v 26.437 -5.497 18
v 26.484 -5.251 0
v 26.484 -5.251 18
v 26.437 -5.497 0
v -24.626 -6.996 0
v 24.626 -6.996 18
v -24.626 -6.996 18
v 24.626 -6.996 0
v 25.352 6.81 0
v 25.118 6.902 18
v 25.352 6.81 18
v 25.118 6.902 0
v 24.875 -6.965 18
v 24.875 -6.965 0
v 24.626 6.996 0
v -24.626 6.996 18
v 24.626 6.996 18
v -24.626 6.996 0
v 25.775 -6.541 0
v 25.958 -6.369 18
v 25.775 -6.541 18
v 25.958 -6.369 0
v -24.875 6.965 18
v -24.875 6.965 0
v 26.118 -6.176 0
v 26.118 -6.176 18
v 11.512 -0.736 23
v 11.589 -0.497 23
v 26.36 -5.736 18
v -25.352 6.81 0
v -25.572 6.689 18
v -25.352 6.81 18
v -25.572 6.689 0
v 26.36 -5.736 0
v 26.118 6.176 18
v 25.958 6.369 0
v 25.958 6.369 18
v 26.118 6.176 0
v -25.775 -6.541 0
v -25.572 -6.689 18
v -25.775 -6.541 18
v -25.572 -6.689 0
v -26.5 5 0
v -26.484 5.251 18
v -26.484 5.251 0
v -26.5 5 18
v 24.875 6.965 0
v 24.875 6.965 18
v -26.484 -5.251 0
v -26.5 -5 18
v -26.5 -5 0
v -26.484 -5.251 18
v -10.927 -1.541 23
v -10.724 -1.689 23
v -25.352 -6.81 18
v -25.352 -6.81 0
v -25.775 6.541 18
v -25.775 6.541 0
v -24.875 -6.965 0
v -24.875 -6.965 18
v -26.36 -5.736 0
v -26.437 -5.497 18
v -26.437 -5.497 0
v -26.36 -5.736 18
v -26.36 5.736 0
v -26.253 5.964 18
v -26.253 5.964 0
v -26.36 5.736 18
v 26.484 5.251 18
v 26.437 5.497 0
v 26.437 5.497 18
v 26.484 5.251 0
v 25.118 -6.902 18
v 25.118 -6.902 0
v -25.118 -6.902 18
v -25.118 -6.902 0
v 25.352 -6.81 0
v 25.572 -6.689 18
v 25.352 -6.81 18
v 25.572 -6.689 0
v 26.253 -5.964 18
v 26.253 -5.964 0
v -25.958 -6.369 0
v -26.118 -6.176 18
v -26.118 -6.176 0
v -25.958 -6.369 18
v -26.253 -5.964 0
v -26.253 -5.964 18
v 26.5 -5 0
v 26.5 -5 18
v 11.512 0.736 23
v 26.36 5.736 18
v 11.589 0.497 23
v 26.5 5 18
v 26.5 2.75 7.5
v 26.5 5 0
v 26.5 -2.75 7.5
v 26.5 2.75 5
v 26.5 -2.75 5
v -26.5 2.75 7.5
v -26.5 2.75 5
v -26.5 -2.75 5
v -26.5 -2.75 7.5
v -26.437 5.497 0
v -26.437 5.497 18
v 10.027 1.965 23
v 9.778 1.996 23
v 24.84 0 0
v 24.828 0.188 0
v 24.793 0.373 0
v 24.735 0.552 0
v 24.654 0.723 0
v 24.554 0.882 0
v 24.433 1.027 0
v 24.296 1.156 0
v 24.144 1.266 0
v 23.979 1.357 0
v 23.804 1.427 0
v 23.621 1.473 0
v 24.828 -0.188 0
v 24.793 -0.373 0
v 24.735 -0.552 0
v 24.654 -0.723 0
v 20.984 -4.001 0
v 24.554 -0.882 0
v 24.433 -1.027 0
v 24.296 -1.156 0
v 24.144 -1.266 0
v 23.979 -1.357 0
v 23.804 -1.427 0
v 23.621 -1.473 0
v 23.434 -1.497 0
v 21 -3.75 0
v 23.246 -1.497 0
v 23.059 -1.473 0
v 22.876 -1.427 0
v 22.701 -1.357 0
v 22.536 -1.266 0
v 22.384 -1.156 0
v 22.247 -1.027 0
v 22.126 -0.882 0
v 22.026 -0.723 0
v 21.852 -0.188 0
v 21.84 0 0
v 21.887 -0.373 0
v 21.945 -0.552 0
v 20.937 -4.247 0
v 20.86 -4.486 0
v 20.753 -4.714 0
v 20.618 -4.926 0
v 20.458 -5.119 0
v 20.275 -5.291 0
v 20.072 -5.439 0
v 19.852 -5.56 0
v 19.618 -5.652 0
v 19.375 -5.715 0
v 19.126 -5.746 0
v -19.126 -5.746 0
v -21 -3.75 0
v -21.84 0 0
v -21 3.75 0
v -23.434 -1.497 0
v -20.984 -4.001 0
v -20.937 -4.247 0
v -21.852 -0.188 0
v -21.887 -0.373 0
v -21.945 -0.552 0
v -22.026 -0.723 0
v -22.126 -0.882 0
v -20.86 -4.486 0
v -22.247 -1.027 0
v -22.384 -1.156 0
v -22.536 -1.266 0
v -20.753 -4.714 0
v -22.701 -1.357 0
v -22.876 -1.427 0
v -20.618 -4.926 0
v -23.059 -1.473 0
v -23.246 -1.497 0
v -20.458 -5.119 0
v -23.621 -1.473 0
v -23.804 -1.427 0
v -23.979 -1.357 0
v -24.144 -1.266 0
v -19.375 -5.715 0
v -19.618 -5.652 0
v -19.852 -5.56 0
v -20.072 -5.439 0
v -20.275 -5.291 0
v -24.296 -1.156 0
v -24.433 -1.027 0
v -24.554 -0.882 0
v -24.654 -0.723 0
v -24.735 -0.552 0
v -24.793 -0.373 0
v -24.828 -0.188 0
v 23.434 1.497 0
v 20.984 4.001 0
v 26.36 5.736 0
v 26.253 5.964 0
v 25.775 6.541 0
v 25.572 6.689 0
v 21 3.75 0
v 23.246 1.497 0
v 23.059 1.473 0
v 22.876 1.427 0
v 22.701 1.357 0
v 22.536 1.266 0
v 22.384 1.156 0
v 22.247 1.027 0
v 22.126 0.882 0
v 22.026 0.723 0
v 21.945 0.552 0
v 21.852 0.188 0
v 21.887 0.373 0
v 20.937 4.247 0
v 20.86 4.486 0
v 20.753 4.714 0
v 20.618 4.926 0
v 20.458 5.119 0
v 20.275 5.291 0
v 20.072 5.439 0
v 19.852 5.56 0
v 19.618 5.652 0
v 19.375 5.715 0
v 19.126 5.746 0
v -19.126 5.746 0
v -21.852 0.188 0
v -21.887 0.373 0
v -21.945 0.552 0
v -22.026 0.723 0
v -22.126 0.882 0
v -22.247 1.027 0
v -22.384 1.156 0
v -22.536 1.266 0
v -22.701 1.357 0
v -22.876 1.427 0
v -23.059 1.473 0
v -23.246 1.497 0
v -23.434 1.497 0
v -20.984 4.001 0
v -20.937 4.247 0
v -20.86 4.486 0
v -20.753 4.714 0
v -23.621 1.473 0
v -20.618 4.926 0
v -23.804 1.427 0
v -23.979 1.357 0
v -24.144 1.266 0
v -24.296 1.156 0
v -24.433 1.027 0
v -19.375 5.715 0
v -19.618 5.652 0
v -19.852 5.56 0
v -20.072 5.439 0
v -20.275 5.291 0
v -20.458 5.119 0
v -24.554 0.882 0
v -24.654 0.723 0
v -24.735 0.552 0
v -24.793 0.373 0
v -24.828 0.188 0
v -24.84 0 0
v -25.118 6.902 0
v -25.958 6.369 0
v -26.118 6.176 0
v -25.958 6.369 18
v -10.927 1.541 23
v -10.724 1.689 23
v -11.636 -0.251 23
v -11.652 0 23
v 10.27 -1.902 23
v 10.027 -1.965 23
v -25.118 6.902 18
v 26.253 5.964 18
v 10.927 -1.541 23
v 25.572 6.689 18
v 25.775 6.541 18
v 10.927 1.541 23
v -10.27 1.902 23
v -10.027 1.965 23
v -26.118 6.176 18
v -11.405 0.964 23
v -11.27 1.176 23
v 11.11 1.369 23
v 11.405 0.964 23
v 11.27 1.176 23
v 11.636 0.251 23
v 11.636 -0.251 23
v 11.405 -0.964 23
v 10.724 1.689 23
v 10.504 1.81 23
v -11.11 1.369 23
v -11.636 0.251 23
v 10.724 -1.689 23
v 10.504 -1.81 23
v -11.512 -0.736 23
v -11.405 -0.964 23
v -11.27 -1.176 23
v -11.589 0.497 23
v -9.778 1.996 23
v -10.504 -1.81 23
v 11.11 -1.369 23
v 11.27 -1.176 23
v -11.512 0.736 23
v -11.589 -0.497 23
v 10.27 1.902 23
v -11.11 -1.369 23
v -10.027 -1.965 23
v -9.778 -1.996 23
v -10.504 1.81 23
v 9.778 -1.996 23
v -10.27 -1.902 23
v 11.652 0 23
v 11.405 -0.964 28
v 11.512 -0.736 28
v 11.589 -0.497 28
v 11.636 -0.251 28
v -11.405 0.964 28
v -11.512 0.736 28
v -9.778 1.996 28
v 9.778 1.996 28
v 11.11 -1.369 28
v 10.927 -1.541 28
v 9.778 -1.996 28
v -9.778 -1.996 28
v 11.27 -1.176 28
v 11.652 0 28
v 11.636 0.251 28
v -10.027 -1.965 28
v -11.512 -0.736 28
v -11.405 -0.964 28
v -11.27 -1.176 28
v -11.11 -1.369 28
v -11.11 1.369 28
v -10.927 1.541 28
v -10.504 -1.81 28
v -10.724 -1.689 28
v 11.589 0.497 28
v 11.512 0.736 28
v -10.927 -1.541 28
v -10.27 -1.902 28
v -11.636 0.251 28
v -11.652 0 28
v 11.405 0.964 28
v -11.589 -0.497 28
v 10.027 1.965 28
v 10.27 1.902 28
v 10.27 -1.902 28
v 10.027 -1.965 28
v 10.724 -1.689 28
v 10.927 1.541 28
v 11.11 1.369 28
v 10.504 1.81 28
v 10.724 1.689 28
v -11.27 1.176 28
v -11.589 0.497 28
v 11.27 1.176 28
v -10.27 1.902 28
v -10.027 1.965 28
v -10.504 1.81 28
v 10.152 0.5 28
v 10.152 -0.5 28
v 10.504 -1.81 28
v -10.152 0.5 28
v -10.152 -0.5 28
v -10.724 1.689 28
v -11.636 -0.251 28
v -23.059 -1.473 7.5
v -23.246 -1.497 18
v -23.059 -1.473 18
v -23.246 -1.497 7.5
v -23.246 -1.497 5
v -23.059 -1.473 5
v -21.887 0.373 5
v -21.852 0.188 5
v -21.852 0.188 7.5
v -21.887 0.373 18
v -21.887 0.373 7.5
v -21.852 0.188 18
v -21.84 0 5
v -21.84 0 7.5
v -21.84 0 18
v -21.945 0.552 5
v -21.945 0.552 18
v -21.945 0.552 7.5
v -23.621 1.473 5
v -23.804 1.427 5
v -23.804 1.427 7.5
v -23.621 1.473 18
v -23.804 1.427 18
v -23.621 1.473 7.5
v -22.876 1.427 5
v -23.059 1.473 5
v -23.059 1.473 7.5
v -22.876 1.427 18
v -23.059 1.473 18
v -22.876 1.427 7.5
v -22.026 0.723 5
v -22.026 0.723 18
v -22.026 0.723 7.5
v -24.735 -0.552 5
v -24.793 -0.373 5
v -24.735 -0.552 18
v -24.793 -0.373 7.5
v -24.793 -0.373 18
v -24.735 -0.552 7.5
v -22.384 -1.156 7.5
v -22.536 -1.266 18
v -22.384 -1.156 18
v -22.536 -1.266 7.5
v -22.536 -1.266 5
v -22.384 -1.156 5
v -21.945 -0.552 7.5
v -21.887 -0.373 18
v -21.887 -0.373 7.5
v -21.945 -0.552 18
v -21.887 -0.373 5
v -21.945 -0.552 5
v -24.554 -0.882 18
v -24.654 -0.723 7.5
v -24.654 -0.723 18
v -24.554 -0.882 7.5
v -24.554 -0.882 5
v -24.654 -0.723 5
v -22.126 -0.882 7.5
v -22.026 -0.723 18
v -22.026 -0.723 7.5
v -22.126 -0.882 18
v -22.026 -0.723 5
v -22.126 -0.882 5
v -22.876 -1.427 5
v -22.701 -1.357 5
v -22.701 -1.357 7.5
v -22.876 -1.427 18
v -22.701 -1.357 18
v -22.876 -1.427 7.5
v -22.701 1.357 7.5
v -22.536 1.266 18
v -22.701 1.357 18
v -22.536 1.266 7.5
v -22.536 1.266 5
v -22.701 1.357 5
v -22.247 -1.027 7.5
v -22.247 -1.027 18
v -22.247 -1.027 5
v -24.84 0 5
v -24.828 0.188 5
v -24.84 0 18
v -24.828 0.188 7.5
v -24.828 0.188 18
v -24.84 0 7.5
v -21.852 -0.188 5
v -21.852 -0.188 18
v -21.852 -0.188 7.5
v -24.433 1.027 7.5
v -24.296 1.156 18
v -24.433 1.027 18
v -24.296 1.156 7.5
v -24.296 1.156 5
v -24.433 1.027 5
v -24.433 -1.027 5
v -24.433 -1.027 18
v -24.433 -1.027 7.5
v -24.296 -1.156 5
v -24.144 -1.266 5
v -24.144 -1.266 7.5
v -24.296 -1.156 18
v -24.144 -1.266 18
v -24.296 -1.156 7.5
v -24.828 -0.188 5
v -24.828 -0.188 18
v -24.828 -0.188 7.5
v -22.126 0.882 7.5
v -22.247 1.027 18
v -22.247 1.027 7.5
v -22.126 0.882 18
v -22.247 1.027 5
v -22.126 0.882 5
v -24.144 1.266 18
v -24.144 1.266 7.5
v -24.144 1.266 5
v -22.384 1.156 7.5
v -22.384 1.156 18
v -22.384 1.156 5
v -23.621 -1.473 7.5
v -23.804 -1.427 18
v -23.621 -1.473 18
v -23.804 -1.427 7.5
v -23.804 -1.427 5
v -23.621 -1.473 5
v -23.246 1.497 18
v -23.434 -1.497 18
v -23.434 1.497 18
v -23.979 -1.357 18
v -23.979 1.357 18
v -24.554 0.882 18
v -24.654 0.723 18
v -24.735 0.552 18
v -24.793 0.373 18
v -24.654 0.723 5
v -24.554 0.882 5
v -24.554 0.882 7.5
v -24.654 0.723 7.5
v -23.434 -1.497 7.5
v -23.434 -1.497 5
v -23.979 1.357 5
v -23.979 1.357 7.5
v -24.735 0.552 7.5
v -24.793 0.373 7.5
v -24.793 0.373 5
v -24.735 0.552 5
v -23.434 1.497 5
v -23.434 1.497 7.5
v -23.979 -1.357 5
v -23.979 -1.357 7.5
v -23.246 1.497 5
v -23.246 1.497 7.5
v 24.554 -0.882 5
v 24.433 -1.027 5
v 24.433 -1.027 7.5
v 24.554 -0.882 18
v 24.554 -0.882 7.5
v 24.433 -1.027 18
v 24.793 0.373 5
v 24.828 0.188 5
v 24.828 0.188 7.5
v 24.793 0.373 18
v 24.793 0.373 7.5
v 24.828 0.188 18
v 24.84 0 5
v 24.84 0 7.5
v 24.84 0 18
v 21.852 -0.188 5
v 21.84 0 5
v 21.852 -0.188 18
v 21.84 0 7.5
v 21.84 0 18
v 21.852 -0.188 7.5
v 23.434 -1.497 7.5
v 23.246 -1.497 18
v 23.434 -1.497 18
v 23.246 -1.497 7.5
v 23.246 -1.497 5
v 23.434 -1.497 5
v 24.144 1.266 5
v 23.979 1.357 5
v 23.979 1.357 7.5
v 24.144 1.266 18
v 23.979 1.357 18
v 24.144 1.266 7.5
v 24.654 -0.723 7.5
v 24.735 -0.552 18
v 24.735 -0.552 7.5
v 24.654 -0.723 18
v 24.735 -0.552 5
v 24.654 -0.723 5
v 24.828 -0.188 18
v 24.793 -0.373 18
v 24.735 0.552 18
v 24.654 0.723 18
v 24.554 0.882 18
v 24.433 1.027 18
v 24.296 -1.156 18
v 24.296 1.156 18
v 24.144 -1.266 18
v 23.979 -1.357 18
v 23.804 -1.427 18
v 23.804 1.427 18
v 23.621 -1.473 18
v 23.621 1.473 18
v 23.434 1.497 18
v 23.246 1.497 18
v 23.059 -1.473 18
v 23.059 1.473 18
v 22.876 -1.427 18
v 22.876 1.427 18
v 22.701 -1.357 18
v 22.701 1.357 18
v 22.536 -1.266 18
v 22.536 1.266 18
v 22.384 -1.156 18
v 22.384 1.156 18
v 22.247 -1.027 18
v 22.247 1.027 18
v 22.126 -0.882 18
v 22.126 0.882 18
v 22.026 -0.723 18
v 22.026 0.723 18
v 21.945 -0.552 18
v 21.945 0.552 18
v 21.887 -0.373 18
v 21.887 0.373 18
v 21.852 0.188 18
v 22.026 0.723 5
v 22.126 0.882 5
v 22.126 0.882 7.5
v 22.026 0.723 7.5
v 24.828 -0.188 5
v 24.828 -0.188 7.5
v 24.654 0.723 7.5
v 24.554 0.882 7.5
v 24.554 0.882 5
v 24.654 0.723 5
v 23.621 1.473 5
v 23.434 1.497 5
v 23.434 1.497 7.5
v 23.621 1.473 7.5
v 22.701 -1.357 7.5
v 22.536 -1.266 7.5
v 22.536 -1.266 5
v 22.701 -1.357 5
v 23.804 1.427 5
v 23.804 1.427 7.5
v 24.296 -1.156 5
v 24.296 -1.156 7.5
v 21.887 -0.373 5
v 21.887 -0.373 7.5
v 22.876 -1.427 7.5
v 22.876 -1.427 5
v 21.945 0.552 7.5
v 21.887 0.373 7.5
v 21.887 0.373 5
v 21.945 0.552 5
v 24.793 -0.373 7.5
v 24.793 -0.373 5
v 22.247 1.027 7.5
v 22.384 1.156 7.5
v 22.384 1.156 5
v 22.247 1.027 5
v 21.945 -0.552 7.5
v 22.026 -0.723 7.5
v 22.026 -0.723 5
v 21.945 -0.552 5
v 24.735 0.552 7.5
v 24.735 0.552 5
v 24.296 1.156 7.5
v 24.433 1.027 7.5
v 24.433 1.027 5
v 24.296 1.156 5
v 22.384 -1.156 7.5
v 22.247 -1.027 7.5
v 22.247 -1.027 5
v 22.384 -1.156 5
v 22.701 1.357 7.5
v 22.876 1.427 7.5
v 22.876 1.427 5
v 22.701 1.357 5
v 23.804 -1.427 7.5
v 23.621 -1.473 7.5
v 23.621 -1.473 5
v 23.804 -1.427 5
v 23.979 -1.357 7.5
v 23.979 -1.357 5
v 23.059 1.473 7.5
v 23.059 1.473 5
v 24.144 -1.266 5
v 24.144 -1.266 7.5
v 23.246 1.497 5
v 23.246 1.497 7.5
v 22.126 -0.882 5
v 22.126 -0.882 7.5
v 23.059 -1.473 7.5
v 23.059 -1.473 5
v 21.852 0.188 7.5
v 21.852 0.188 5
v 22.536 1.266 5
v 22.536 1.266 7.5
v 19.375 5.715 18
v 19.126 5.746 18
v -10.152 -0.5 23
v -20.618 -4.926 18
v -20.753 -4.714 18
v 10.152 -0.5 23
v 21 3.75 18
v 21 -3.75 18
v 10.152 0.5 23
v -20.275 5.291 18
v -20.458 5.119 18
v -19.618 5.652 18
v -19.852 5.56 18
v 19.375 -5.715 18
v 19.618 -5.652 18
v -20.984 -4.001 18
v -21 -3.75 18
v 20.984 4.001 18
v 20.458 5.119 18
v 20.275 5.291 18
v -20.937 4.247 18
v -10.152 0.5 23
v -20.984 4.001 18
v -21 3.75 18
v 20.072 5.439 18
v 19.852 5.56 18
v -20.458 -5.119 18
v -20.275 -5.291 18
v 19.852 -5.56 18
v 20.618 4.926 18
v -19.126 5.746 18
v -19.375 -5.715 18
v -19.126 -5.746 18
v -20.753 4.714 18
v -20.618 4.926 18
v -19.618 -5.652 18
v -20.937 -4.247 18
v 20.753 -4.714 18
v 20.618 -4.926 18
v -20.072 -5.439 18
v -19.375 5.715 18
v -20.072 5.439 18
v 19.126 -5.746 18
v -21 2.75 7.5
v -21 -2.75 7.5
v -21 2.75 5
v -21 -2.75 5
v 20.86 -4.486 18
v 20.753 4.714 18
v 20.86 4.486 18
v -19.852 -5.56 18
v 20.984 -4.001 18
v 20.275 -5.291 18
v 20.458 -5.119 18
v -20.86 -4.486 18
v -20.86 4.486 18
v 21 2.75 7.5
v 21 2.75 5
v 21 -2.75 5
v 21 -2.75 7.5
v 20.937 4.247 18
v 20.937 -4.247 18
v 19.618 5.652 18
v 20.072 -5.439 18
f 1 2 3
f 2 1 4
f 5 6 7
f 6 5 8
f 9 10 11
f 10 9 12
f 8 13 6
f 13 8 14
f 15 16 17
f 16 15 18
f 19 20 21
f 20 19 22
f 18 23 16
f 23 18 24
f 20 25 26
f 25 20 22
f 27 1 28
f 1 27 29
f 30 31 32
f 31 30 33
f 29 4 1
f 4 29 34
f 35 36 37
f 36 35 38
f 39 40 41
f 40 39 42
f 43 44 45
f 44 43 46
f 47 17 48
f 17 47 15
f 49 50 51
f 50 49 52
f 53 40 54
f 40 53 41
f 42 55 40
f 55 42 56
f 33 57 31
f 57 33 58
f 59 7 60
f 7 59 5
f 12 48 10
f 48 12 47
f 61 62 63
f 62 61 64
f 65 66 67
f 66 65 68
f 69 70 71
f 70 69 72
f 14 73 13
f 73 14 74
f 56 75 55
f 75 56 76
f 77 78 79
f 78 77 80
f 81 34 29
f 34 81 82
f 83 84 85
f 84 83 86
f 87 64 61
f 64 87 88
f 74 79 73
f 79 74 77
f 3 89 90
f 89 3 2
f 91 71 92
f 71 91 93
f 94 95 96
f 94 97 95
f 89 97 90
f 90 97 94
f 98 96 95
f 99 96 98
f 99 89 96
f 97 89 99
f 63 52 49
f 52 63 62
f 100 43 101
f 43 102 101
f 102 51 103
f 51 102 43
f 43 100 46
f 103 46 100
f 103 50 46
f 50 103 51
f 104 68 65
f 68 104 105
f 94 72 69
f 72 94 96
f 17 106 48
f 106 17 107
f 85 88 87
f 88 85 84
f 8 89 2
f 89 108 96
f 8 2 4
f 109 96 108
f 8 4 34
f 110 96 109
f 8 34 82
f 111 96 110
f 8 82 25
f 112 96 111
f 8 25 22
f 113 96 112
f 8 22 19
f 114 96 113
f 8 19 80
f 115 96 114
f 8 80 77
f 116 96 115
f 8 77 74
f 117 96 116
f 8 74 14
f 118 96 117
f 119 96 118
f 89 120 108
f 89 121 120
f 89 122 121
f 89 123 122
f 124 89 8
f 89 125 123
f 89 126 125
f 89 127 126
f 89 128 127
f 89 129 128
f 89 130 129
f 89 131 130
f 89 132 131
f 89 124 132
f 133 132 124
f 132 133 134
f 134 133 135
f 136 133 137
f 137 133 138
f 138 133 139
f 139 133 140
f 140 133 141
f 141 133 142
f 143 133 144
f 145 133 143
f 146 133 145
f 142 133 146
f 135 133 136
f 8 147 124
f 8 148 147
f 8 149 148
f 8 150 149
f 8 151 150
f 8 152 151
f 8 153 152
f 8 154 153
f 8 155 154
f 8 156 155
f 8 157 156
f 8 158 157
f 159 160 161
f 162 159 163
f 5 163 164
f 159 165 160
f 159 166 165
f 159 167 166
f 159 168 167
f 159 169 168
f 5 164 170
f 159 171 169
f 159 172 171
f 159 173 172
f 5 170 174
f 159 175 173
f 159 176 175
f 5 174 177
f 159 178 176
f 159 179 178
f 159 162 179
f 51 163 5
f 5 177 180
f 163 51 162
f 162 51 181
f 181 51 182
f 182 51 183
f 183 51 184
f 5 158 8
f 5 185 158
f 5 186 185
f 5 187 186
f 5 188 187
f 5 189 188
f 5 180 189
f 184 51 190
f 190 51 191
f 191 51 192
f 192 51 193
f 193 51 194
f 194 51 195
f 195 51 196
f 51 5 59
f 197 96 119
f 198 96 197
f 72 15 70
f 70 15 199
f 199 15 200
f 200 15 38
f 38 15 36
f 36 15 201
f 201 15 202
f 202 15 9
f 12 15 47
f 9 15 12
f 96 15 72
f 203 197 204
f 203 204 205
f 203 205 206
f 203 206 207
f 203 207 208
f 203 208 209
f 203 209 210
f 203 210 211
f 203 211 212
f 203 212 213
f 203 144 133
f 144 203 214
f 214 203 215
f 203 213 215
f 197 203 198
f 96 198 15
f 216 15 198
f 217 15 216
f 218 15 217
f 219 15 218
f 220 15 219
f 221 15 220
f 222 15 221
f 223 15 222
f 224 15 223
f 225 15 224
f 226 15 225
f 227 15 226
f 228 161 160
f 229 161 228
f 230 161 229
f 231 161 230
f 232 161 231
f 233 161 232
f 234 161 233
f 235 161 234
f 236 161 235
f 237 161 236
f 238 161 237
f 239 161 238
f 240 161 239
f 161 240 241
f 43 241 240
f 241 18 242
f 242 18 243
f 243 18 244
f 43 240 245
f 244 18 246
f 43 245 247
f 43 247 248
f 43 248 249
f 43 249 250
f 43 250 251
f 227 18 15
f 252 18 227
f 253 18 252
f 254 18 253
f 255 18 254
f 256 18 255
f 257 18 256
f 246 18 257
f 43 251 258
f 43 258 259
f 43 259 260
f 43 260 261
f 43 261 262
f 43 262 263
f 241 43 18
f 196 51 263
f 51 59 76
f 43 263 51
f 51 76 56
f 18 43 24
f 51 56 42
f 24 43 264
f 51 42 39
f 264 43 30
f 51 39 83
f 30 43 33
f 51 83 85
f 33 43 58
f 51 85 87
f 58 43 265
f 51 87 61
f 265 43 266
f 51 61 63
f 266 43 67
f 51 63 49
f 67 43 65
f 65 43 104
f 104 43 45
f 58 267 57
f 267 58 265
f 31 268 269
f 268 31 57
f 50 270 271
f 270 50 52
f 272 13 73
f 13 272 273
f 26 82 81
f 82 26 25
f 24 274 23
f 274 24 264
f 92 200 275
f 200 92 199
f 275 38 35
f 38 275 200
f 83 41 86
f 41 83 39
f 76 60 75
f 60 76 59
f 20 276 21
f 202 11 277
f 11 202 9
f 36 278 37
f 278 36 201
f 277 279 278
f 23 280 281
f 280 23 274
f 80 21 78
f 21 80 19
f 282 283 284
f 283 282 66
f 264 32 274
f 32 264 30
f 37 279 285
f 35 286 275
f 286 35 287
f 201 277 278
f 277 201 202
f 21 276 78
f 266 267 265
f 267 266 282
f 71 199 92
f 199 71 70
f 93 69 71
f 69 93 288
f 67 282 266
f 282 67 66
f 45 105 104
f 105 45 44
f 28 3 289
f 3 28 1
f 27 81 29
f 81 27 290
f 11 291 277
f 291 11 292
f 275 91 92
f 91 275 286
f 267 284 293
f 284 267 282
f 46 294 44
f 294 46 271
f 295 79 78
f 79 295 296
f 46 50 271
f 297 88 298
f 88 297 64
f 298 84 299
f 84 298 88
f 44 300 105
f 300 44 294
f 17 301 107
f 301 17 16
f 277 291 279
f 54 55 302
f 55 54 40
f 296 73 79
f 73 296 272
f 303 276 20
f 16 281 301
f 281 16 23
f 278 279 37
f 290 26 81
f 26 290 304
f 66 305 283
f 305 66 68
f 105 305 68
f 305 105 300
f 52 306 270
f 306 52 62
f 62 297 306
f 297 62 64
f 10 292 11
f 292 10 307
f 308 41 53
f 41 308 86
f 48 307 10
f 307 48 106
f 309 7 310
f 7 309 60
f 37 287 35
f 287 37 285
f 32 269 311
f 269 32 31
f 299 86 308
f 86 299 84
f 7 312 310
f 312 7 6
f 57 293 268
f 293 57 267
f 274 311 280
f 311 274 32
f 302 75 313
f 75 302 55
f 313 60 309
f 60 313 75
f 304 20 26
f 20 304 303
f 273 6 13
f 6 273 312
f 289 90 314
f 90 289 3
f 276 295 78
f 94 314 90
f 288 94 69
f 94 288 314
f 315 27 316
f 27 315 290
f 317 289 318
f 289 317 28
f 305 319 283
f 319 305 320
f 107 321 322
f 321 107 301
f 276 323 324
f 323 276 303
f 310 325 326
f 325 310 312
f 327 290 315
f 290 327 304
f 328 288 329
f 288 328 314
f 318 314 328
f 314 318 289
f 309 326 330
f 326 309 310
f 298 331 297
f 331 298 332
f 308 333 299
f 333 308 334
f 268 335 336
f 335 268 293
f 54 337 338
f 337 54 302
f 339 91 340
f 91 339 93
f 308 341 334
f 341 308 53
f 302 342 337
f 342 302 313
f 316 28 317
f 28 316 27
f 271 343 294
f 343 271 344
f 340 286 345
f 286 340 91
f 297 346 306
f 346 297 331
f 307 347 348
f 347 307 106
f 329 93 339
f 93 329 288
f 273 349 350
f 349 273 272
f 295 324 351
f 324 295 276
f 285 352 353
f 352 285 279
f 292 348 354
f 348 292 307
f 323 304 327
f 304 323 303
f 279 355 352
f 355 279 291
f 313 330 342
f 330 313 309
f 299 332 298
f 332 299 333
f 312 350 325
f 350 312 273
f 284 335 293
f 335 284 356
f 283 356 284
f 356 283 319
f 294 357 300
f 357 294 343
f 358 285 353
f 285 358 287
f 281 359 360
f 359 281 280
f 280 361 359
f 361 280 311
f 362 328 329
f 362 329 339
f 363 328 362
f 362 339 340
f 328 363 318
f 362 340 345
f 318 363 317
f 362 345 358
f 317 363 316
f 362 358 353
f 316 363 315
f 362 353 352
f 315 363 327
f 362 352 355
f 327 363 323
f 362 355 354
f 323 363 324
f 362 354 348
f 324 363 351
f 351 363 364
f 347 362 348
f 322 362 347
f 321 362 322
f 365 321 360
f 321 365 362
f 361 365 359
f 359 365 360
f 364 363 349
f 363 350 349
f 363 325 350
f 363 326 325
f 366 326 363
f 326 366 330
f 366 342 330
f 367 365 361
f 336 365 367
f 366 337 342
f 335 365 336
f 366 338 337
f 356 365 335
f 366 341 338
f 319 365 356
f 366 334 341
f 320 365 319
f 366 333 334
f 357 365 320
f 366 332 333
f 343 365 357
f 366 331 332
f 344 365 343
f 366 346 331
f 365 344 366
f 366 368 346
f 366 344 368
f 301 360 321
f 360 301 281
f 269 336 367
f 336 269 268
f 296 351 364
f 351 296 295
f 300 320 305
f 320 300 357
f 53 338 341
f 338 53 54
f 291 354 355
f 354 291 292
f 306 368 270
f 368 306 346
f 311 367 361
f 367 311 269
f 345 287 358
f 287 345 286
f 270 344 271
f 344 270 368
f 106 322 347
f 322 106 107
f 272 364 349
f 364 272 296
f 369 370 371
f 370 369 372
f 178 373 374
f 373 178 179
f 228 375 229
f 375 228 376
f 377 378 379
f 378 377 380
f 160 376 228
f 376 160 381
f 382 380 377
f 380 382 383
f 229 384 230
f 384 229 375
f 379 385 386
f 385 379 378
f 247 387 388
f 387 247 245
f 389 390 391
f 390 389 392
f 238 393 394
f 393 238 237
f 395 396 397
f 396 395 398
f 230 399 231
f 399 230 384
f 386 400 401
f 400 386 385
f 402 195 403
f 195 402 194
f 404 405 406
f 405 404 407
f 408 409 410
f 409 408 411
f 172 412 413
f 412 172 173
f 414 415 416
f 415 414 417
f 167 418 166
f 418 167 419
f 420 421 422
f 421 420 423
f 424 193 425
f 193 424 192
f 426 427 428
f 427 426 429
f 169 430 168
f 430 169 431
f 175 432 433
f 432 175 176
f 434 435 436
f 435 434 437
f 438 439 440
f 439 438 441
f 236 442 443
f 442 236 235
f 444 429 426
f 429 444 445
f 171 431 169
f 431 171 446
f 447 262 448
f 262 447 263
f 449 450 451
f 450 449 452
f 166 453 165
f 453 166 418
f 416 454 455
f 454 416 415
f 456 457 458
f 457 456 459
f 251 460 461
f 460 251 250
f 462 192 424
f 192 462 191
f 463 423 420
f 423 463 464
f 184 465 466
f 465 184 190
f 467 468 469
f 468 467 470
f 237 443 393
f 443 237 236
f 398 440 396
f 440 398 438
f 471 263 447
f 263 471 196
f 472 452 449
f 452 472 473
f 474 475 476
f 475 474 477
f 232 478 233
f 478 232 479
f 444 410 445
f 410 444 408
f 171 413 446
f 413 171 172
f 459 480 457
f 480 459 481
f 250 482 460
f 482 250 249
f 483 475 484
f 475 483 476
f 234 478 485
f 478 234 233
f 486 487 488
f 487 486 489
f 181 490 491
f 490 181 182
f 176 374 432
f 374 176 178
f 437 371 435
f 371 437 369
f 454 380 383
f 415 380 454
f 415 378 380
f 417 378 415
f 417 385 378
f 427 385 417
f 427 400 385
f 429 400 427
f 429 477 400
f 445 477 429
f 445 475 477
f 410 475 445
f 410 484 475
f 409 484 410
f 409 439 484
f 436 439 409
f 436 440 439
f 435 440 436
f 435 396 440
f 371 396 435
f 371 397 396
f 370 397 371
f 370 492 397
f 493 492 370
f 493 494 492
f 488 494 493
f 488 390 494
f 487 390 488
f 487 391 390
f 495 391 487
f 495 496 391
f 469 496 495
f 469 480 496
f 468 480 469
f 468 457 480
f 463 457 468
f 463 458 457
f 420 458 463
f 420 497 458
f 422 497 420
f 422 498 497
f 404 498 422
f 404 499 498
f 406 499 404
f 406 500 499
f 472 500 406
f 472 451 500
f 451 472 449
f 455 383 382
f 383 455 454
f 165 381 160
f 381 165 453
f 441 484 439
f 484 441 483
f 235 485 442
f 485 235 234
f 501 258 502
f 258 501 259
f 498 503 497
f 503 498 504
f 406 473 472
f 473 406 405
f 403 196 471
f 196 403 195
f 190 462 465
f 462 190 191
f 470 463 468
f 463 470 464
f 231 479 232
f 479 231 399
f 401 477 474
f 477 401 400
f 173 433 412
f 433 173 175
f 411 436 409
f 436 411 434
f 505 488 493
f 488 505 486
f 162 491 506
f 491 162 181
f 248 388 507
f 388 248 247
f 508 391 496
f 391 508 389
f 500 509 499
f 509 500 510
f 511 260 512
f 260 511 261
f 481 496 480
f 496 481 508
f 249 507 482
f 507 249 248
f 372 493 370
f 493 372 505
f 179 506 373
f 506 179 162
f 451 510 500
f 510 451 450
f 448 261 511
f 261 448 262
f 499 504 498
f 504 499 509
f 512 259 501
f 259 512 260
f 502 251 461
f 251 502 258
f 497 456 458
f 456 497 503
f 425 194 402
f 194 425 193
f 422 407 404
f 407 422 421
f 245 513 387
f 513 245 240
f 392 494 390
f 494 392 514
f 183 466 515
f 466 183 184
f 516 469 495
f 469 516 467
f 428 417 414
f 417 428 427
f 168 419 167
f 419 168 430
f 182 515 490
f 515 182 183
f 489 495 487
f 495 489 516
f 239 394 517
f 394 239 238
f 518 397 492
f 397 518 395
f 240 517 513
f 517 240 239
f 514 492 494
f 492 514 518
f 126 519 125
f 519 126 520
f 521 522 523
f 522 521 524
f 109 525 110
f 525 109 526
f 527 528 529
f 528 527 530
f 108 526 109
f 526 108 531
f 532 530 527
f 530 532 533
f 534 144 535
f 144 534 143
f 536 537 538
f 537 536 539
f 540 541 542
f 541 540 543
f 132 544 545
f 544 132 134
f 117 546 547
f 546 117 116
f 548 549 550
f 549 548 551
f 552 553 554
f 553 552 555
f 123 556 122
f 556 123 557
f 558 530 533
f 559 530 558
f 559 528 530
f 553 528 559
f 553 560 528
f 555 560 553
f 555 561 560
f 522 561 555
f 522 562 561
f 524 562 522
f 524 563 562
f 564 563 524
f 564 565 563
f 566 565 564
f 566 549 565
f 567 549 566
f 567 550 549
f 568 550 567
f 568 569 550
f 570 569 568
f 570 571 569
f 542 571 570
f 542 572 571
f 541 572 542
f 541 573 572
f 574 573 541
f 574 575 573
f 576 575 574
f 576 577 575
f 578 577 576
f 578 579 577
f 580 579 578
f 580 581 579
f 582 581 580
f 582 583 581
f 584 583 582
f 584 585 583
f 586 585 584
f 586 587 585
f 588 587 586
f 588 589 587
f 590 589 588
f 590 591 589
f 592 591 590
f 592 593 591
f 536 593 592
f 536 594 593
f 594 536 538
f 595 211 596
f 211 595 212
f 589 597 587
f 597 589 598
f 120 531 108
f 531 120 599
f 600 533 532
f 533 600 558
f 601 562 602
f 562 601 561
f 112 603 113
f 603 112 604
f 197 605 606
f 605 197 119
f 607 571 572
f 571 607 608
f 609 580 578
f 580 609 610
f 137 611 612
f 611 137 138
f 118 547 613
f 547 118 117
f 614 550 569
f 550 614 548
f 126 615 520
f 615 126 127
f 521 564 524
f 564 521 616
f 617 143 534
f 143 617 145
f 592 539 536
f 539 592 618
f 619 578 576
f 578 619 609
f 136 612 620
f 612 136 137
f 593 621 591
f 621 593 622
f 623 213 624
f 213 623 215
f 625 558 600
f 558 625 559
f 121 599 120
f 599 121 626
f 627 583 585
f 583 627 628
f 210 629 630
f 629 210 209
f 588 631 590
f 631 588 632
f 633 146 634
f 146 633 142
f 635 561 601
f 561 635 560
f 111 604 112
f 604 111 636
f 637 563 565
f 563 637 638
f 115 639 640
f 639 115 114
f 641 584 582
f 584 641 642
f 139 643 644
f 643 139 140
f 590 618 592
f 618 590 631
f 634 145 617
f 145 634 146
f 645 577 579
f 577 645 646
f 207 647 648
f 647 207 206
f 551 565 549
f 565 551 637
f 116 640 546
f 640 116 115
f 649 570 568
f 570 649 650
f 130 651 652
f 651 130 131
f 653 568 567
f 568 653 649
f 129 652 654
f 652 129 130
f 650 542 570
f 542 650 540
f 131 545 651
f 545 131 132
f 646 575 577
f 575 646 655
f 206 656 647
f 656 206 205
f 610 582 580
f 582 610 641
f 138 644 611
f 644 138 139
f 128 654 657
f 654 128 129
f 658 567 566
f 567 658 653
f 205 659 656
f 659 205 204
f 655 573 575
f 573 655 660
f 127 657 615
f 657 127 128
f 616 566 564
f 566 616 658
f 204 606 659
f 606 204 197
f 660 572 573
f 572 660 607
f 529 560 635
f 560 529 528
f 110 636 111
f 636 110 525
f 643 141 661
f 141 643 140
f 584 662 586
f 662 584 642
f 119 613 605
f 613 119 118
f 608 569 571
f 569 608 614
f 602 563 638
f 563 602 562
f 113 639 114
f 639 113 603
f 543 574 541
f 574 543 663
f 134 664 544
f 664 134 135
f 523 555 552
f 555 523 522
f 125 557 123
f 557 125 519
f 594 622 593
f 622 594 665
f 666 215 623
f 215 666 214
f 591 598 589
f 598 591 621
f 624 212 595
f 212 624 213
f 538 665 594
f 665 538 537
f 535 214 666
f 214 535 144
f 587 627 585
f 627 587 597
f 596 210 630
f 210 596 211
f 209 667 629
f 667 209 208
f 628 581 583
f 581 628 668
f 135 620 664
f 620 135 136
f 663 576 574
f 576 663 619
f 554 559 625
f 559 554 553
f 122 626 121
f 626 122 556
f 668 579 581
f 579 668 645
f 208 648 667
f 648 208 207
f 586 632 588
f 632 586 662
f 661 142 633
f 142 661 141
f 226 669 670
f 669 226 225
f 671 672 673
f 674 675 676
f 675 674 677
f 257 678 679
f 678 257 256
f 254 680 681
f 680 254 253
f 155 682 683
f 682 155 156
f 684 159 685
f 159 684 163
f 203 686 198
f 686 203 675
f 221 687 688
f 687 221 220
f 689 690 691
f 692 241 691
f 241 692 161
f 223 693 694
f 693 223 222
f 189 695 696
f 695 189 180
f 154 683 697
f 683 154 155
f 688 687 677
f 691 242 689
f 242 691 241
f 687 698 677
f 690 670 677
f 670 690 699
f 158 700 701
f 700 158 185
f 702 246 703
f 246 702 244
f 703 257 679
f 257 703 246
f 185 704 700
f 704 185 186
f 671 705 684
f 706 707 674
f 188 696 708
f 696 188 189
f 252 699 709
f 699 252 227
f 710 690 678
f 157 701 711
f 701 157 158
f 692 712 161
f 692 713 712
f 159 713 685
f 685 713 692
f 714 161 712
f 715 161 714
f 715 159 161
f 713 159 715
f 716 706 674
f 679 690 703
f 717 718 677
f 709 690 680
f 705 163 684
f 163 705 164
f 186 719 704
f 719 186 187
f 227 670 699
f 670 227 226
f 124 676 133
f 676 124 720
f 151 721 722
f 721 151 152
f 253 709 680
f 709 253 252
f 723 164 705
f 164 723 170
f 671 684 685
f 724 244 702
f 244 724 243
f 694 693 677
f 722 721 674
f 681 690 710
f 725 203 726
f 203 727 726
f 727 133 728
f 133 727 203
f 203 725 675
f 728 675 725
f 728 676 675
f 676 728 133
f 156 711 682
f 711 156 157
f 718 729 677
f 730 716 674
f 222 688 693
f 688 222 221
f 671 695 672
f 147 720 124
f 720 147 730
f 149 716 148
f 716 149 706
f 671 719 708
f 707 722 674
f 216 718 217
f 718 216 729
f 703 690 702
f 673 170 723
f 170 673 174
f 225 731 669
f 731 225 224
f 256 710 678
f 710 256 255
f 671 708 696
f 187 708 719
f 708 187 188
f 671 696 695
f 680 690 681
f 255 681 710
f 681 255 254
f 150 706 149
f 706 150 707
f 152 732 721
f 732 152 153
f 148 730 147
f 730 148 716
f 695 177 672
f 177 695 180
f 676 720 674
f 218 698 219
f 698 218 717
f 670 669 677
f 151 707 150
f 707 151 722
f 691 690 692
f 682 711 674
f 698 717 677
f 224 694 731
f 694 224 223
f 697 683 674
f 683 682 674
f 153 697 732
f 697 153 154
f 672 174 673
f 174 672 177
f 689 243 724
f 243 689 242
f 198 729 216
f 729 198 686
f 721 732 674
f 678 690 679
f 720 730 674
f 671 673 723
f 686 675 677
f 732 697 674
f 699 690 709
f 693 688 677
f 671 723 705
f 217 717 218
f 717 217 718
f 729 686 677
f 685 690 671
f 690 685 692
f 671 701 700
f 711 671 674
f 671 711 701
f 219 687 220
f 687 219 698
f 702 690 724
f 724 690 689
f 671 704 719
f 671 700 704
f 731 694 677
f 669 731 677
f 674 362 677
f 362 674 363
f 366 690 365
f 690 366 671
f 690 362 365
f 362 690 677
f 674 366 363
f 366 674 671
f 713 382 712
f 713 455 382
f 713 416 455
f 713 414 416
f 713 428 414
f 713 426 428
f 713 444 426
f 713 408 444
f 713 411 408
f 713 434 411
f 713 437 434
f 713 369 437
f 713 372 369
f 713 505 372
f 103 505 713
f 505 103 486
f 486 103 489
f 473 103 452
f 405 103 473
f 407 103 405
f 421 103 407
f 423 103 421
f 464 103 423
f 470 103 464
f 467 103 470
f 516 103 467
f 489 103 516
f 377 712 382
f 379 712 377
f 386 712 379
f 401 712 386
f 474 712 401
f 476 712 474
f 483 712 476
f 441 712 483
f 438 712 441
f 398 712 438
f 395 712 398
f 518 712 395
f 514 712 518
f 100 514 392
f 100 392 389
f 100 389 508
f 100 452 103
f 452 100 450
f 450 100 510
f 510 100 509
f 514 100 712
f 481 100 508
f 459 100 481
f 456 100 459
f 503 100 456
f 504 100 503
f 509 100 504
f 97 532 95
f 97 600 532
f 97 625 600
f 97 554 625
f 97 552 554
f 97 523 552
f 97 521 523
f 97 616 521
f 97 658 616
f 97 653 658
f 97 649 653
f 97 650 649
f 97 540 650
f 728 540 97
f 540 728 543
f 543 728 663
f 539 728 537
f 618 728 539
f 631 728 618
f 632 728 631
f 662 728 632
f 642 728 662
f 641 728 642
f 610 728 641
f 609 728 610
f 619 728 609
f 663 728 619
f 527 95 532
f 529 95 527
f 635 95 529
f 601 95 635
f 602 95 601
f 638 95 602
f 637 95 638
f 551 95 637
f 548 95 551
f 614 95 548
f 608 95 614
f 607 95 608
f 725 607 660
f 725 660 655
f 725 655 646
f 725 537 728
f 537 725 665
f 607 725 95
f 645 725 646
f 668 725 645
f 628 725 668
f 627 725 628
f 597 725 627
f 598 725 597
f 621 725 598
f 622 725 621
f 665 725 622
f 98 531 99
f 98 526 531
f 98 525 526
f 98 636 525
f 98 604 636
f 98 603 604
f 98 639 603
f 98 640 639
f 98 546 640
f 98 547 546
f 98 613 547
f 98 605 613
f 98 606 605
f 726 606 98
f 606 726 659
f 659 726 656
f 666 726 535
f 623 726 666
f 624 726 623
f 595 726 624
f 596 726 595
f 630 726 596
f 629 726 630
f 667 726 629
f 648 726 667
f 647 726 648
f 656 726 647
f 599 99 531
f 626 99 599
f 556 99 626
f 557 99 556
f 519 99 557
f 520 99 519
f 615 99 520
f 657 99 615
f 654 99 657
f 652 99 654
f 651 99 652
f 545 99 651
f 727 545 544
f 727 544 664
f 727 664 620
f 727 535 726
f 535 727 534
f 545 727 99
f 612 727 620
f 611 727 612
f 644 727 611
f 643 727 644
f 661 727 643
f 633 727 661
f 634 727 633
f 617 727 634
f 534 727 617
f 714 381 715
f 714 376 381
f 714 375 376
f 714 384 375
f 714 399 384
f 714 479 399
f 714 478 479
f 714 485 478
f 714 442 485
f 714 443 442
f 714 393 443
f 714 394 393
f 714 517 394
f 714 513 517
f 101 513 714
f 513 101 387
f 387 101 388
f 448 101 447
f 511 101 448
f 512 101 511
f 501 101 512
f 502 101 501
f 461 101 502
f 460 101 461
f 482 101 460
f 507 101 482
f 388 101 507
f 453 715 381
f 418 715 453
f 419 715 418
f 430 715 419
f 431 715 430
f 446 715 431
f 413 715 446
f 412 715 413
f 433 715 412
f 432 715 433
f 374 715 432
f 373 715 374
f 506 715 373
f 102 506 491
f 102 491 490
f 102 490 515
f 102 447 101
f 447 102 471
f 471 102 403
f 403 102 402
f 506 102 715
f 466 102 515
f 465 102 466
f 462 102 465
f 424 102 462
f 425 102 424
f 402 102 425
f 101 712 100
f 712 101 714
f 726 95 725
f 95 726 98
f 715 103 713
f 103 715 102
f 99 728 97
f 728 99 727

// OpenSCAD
// file: lib/chassis-connector-housing.scad
// Chassis Connector Housing
// By Hans Christian Saustrup <hc@saustrup.net>
model_version = "v0.0.1";

ds = 3.0;
t = 1.5;

module flat_rounded_cube(size, d=4) {
    _size = [
        size.x - d,
        size.y - d,
        size.z
    ];

    translate([d/2, d/2])
    hull()
    for (x=[0, 1])
    for (y=[0, 1])
    translate([
        x * _size.x,
        y * _size.y,
        0
    ])
    cylinder(d=d, h=_size.z);
}

module _cube(size, d=4) {
    flat_rounded_cube(size, d);
    // cube(size);
}

module __generic_chassis_connector_housing(cutout, screw_distance, wires) {

    echo(["Cutout:", cutout]);
    echo(["Screw distance:", screw_distance]);

    // Flat cable - leave room for one extra wire
    cable_pitch = 1.269;
    cable_hole = [wires * cable_pitch, 1, 5];

    house1 = [
        screw_distance + 6.32,
        cutout.y + 1 + t,
        18
    ];

    house1_cutout = [
        cutout.x,
        cutout.y,
        house1.z
    ];

    house2 = [
        cable_hole.x + (2*t),
        cable_hole.y + (2*t),
        cable_hole.z
    ];
    house2_cutout = cable_hole;

    screw_cutout = [
        house1.x,
        5.5, // Nut width
        2.5 // Nut height
    ];

    difference() {
        union() {
            hull() {
                translate([-house1.x/2, -house1.y/2])
                _cube(house1, d=4);
                translate([-house2.x/2, -house2.y/2, house1.z])
                _cube(house2);
            }
            translate([-house2.x/2, -house2.y/2, house1.z + house2.z])
            _cube(house2);
        }
        union() {
            hull() {
                translate([-house1_cutout.x/2, -house1_cutout.y/2])
                _cube(house1_cutout);
                translate([-house2_cutout.x/2, -house2_cutout.y/2, house1.z])
                cube(house2_cutout);
            }
            translate([-house2_cutout.x/2, -house2_cutout.y/2, house1.z + house2.z])
            cube(house2_cutout);

            translate([-screw_cutout.x/2, -screw_cutout.y/2, screw_cutout.z * 2])
            cube(screw_cutout);

            for (x=[-0.5,0.5])
            translate([screw_distance*x, 0])
            cylinder(r=ds/2, h=house1.z);
        }
    }

}

module chassis_connector_housing_db(pins, wires=0) {
    // Row with most pins:
    maxpins = pins - floor(pins/2);

    pin_pitch = 2.775;
    pin_width = 1.7;
    pin_to_pin = (maxpins-1) * pin_pitch + pin_width;

    inside = [
        pin_to_pin + 7,
        11.5,
        5
    ];

    screw_distance = inside.x + 4.68;
    __generic_chassis_connector_housing(inside, screw_distance, wires != 0 ? wires : pins + 1);
}

module chassis_connector_housing_centronics(pins, wires=0) {
    pin_columns = pins / 2;

    pin_pitch = 2.11;
    pin_width = 1.20;
    pin_to_pin = (pin_columns - 1) * pin_pitch + pin_width;

    __generic_chassis_connector_housing(
        [
            pin_to_pin + 10.5,
            15,
            3.5
        ],
        pin_to_pin + 22.5,
        wires
    );
}
// main file
use <lib/chassis-connector-housing.scad>;

$fn = $preview ? 0 : 50;

chassis_connector_housing_db(25, 16);
